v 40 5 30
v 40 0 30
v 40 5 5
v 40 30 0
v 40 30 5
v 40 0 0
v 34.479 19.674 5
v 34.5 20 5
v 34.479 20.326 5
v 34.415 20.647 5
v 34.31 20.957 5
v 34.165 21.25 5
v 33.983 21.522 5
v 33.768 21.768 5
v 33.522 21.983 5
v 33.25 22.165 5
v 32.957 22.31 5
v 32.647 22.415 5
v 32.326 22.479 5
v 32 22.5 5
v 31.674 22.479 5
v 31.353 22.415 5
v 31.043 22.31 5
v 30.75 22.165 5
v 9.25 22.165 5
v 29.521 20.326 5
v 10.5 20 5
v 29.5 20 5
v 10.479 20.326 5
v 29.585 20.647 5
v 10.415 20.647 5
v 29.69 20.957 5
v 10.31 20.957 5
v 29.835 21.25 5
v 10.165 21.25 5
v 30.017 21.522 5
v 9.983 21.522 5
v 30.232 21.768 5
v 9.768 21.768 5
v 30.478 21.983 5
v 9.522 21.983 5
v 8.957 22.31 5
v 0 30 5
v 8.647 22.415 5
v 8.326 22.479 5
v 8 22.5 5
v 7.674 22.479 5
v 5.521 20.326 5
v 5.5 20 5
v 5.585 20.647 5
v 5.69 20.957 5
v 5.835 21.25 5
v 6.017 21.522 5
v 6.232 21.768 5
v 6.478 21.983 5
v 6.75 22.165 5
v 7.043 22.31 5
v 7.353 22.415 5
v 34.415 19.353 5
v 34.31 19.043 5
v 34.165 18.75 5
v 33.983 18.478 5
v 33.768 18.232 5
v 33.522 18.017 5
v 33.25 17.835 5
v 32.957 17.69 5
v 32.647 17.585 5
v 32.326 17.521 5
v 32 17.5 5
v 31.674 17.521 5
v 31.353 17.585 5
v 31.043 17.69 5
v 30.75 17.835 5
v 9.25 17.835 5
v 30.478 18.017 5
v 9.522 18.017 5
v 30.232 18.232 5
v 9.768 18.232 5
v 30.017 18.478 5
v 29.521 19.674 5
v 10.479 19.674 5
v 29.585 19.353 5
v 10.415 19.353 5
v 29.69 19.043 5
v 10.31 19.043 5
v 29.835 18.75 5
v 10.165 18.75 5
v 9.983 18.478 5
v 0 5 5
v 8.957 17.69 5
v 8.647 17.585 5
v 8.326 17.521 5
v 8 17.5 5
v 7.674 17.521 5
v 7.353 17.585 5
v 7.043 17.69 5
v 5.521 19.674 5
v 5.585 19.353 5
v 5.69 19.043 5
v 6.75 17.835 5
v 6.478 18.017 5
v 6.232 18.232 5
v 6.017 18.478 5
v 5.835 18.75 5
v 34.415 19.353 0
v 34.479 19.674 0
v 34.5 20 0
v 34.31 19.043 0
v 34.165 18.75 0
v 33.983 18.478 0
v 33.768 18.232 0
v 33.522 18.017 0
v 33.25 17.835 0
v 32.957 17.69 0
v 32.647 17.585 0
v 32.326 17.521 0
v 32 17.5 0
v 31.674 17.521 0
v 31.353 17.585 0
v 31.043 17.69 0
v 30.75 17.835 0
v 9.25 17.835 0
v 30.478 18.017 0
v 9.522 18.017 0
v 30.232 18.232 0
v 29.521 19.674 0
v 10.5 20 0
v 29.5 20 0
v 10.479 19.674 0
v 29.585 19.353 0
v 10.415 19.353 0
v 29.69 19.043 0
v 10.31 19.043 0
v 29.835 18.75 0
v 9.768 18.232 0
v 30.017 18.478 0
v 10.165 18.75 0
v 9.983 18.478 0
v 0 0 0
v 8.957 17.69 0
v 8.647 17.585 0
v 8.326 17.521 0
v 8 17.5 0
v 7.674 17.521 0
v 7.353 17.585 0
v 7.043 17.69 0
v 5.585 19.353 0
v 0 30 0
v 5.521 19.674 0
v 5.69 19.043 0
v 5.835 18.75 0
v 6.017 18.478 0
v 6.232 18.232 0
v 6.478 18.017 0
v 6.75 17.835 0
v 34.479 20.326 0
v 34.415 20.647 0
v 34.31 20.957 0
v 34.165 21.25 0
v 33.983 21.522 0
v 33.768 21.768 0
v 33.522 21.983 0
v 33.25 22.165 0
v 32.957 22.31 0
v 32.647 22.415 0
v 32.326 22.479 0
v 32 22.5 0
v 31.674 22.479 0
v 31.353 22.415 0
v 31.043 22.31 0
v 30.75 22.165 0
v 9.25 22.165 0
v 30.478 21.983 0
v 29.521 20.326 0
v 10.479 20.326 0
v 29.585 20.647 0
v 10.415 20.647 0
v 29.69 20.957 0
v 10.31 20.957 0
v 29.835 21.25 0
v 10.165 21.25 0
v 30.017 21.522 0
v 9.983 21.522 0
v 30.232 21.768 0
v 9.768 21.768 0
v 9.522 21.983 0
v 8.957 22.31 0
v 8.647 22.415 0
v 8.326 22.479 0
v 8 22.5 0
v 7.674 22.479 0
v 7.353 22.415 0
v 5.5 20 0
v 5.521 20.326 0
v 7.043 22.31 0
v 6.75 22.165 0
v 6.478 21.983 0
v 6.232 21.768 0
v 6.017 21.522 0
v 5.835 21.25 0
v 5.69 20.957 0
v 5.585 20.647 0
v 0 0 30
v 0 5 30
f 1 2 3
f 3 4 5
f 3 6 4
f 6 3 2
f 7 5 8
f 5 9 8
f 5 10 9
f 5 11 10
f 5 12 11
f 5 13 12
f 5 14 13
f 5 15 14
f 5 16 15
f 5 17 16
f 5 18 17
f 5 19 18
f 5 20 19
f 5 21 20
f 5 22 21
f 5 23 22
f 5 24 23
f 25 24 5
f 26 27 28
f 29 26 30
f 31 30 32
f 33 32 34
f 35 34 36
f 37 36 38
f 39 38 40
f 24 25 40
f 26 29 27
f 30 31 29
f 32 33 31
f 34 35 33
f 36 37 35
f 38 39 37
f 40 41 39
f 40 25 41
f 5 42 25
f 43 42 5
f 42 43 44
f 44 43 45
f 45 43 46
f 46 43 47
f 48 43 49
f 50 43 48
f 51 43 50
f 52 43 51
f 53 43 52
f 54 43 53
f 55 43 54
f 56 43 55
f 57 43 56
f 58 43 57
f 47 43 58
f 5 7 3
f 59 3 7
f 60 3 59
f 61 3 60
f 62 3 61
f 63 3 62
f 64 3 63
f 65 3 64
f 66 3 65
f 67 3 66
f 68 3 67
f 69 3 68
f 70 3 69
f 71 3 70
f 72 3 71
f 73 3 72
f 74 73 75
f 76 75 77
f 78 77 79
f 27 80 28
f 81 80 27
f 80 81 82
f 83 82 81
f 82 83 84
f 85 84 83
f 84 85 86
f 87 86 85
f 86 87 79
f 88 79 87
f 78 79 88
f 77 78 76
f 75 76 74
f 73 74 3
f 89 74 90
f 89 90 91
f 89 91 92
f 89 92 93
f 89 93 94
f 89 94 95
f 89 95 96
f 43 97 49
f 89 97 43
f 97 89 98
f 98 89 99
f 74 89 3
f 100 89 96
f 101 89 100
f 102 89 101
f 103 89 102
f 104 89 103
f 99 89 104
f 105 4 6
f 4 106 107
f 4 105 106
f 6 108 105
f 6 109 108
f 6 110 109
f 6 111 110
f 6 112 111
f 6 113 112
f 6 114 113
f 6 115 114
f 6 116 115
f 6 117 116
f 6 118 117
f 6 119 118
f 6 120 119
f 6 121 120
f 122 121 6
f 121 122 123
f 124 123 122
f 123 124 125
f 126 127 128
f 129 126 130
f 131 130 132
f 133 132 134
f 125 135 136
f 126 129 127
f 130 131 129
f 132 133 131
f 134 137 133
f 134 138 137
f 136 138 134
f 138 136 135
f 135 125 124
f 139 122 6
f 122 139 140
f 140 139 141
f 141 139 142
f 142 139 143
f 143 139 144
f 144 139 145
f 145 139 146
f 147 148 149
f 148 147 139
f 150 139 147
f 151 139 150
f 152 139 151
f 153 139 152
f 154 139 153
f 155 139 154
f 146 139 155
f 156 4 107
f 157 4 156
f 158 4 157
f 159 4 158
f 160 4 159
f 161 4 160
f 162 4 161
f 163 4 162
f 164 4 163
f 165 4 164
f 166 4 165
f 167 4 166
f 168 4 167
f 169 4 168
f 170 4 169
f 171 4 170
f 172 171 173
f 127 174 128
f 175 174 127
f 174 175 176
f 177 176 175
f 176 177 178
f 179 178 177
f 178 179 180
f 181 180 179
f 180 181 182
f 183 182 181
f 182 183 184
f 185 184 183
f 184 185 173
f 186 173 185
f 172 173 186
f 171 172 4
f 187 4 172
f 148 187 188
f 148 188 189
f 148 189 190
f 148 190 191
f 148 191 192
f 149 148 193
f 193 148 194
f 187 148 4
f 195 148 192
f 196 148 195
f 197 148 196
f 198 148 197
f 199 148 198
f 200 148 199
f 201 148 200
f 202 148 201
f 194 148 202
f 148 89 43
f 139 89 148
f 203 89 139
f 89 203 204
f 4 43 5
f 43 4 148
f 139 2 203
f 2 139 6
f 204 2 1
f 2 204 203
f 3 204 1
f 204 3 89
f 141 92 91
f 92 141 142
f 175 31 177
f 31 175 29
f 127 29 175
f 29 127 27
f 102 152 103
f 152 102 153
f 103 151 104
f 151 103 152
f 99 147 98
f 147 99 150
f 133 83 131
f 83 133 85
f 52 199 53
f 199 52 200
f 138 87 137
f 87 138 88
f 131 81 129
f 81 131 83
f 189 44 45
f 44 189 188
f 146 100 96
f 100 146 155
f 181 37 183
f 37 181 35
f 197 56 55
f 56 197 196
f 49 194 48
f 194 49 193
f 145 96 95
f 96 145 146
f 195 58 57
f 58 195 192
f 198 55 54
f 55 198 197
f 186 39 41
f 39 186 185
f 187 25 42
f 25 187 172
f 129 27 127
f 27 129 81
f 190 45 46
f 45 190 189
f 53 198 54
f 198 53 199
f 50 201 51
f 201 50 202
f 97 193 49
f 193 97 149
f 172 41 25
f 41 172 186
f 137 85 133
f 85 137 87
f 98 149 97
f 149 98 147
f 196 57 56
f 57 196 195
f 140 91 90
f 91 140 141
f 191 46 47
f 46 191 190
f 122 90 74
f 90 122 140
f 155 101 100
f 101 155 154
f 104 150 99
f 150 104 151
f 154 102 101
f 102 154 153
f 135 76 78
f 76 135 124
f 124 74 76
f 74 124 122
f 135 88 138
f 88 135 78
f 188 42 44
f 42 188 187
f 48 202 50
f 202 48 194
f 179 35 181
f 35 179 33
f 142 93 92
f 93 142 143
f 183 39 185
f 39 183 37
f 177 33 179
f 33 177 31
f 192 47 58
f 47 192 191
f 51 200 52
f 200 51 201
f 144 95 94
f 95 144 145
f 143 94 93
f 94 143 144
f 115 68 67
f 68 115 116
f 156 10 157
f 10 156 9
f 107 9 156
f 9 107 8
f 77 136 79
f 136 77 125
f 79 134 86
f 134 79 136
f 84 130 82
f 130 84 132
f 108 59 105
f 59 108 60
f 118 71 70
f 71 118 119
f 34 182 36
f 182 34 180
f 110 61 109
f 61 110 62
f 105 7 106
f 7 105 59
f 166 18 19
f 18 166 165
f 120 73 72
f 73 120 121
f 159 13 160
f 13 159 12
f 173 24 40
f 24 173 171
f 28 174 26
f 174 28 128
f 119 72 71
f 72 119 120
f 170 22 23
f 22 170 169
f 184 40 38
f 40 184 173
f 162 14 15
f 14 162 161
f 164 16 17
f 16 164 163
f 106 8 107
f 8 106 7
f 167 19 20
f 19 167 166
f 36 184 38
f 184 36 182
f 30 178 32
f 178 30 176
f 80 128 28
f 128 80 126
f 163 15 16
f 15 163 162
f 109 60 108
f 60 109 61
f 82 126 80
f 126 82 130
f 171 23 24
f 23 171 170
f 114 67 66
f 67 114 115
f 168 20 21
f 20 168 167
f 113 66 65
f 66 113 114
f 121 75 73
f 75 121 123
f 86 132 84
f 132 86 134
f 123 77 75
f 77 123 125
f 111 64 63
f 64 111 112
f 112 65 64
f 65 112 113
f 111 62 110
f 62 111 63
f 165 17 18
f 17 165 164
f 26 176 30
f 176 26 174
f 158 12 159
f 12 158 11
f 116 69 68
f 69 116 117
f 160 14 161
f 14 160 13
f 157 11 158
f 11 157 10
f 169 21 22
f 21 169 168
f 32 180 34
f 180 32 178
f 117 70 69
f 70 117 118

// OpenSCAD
$fn=48;
// Base plate X40 Y30 Z5; upright at Y0..5 up to Z30.
// Holes: centre line Y=15, offset +5 away from upright -> Y=20; X=20+-12.
difference(){
  union(){
    cube([40,30,5]);
    cube([40,5,30]);
  }
  for(x=[8,32]) translate([x,20,-1]) cylinder(d=5,h=7);
}
